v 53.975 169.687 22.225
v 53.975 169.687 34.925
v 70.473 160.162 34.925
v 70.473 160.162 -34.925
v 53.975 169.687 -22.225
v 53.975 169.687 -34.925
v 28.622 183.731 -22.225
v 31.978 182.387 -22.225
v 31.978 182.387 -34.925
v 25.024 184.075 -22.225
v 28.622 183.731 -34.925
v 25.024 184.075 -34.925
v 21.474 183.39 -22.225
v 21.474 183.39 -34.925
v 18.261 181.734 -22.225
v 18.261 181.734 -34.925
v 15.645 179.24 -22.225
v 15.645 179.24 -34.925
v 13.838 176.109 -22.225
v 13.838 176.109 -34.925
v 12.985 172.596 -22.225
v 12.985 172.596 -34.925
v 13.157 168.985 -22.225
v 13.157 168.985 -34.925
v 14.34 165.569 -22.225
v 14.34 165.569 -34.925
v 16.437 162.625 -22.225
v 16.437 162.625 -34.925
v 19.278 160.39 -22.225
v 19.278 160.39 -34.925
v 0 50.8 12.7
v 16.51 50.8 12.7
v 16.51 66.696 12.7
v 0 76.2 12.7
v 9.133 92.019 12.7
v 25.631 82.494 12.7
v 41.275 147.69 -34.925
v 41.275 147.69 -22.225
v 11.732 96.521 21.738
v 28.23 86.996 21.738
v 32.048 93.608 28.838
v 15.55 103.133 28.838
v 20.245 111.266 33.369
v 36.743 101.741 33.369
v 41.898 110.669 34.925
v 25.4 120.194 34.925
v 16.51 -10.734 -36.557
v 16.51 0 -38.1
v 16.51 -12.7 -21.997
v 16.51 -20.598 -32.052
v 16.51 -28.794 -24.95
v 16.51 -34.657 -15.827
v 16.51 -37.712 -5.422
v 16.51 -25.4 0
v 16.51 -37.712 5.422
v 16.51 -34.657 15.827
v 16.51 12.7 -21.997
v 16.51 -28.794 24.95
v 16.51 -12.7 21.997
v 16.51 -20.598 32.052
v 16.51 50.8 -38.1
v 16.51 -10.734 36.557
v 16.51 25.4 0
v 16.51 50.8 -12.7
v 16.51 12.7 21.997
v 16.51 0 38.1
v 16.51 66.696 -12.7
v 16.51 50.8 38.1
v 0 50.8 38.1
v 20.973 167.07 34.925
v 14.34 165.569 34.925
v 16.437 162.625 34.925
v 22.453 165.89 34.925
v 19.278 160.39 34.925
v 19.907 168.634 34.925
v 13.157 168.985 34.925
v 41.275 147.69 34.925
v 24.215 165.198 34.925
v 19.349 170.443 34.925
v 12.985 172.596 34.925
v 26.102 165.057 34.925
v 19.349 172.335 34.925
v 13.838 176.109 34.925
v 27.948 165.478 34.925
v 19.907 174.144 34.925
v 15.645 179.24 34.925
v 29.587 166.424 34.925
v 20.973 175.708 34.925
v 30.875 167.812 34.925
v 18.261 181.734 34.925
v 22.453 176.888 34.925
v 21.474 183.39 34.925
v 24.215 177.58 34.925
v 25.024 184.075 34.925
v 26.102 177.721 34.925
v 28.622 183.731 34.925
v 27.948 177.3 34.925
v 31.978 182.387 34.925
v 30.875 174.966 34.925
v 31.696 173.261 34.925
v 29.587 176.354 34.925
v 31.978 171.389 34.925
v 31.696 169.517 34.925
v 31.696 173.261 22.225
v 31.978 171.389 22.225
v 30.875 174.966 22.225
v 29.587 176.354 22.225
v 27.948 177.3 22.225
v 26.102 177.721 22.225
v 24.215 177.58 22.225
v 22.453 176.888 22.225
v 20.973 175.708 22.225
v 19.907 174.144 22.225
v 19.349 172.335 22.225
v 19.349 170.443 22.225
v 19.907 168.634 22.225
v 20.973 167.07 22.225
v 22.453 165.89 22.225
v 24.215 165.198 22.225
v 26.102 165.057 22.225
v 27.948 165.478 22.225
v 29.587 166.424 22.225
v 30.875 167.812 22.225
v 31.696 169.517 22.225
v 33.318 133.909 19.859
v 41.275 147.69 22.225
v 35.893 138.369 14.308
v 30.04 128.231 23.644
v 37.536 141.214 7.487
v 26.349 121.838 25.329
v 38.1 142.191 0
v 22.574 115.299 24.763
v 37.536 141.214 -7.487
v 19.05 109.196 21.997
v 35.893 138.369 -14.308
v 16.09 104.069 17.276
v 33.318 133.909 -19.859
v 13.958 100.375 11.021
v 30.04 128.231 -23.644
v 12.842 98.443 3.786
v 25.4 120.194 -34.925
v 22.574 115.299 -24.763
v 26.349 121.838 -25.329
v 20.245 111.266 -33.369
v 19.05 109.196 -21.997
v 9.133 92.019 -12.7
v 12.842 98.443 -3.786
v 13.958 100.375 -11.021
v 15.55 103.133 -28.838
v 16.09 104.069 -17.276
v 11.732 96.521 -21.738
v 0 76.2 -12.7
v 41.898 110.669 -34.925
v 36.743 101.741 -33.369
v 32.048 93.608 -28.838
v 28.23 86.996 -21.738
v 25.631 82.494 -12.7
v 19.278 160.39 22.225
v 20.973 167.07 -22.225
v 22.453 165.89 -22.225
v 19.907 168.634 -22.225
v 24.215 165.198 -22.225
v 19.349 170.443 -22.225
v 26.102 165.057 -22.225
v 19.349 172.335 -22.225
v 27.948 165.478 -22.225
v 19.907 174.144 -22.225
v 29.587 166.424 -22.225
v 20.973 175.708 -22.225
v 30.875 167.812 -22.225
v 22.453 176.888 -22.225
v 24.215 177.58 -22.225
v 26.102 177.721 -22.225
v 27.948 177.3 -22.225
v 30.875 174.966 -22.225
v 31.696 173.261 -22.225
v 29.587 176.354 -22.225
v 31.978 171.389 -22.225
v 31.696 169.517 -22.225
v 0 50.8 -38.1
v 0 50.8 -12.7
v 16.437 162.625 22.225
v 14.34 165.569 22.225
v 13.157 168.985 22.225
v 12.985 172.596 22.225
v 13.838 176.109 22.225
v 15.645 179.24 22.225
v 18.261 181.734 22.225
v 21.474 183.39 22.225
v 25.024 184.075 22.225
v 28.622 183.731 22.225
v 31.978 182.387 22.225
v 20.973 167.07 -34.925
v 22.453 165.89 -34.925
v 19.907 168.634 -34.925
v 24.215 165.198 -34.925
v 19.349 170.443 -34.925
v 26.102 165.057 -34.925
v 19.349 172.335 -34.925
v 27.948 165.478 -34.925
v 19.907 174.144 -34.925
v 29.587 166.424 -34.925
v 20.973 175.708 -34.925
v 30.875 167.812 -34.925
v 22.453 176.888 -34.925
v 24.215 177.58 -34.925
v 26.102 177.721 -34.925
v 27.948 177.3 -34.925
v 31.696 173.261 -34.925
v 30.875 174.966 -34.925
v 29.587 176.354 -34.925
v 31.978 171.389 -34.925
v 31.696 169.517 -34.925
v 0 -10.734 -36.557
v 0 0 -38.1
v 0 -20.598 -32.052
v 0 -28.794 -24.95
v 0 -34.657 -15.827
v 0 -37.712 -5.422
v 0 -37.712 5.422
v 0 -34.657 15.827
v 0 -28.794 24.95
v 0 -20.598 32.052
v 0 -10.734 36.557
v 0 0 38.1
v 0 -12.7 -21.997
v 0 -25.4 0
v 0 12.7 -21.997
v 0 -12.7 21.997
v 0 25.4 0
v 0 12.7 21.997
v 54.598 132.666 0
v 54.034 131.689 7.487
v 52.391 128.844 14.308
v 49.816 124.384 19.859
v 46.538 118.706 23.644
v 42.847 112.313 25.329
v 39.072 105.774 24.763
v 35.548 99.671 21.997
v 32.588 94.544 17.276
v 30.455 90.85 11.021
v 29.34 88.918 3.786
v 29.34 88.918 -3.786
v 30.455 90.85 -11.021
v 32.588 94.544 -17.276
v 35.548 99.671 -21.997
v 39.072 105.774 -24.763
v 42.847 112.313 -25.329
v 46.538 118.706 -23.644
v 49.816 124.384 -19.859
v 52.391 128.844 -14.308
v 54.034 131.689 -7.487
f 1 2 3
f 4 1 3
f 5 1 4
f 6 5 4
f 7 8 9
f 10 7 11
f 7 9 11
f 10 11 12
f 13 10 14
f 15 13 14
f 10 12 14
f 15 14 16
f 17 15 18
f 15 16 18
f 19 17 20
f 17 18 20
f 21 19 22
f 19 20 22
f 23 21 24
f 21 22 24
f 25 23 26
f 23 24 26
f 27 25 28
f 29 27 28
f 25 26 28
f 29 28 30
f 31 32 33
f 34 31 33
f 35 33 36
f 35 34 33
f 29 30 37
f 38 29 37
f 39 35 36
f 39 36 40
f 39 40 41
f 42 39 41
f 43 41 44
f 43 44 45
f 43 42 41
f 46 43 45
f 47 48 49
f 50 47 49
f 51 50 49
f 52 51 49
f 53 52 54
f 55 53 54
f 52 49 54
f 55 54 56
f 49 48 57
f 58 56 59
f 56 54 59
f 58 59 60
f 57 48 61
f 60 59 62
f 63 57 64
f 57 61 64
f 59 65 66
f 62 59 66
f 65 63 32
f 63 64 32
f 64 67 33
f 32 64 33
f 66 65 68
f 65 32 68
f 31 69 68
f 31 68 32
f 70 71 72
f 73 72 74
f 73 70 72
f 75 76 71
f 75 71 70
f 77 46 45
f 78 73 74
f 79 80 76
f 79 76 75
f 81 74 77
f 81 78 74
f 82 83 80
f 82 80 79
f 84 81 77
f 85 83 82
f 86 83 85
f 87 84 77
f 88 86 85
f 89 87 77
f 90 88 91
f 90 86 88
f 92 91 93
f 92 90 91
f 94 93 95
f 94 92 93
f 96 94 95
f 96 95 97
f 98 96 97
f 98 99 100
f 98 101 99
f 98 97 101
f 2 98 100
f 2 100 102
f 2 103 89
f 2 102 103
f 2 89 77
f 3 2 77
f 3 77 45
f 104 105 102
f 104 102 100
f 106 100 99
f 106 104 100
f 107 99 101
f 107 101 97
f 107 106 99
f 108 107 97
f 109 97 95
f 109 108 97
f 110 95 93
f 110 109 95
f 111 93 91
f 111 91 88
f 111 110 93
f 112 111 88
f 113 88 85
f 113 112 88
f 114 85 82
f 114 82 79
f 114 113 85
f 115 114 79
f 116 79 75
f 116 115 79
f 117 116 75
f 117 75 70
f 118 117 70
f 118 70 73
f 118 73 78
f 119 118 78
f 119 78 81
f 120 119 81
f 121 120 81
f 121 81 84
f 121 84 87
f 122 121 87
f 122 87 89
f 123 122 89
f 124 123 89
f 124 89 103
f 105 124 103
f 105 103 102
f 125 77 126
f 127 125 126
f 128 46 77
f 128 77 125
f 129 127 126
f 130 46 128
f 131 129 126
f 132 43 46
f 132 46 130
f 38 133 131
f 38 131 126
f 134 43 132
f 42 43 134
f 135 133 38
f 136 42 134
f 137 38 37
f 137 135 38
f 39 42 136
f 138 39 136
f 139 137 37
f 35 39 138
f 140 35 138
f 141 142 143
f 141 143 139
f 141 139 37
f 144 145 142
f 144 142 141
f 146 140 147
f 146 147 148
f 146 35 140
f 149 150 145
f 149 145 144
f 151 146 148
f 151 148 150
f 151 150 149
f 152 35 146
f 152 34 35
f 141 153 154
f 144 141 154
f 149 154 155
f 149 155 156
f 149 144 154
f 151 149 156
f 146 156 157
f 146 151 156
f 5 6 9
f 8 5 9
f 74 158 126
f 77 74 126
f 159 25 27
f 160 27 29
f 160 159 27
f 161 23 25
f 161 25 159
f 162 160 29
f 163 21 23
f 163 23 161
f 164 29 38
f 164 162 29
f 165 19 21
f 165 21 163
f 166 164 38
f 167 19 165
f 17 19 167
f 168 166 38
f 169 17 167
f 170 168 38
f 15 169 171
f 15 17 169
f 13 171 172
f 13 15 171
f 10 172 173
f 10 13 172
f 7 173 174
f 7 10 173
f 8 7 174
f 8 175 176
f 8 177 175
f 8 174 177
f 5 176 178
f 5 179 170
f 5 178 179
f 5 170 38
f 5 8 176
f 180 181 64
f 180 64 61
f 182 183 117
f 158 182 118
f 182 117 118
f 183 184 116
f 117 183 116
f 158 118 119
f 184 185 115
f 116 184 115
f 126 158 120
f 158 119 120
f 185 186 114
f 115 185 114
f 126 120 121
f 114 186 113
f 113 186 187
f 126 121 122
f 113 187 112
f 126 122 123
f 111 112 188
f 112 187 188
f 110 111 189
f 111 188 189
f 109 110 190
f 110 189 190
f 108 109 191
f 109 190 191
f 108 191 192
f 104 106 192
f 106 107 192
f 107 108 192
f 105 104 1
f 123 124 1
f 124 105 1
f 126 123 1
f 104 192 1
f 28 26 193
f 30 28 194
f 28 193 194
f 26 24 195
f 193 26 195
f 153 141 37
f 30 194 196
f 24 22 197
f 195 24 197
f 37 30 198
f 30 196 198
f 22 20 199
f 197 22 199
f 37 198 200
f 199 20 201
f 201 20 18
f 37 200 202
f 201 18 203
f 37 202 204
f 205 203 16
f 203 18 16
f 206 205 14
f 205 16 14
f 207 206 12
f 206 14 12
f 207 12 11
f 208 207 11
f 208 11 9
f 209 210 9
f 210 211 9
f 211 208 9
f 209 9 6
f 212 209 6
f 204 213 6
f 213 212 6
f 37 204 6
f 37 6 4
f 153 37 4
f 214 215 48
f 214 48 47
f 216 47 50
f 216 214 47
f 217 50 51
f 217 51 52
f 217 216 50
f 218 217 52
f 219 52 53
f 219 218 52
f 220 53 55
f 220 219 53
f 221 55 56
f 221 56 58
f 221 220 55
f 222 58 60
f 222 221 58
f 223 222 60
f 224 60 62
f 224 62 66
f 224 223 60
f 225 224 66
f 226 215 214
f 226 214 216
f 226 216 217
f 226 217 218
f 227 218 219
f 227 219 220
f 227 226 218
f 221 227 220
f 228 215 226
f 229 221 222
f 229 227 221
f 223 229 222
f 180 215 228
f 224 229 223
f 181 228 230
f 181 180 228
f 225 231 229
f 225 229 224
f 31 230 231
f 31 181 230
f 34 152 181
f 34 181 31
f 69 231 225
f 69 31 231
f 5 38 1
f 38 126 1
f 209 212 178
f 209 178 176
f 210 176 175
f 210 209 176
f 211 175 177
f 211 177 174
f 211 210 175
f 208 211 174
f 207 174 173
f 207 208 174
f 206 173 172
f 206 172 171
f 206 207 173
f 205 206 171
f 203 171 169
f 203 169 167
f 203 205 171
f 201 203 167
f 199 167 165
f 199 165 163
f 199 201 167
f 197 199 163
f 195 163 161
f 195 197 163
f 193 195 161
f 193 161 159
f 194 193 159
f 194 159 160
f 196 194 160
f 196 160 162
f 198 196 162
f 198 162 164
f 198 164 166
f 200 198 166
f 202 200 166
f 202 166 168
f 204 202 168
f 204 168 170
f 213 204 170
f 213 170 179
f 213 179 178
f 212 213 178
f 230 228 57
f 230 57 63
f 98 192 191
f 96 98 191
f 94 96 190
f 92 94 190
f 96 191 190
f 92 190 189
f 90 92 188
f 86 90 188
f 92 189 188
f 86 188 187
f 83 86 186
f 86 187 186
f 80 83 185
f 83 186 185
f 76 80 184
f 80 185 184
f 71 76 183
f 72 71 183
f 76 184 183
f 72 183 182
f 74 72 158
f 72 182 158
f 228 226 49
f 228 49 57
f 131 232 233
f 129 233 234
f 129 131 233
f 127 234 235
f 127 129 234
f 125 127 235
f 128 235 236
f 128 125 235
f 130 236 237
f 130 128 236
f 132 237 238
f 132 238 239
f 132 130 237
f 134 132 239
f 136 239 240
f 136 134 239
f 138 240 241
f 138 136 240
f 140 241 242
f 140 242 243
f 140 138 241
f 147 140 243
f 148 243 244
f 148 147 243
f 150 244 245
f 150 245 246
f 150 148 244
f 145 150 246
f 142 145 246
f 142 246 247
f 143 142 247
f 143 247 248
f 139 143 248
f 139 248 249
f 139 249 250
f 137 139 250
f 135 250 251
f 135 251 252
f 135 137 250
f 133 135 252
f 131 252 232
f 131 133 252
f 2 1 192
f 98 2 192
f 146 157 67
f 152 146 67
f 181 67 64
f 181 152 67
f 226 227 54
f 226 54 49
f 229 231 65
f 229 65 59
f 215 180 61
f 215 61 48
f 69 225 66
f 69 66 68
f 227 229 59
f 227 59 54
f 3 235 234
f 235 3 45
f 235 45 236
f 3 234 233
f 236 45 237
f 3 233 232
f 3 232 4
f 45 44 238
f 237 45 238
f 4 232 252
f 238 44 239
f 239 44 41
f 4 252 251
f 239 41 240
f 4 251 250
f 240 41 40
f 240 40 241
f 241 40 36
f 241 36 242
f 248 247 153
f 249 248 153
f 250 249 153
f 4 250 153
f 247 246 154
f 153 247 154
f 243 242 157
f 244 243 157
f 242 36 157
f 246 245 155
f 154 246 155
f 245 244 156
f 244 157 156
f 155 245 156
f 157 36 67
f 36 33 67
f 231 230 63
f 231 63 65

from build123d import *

# Parameters (mm, degrees)
BOSS_EXTRUDE1_DEPTH      = 16.51
SKETCH2_R                = 25.4
BOSS_EXTRUDE2_DEPTH      = 19.05
BOSS_EXTRUDE3_DEPTH      = 34.925
BOSS_EXTRUDE3_DEPTH_BACK = 34.925
SKETCH3_R                = 6.35
SKETCH3_2_R              = 6.35
CUT_EXTRUDE1_DEPTH       = 22.225


with BuildPart() as part:
    # Sketch1 → Boss-Extrude1 (new body)
    with BuildSketch(Plane(origin=(0, 0, 0), x_dir=(0, 0, -1), z_dir=(1, 0, 0))):
        with BuildLine():
            Line((-38.1, 0), (-38.1, 50.8))
            Line((-38.1, 50.8), (-12.7, 50.8))
            Line((-12.7, 50.8), (-12.7, 76.2))
            Line((-12.7, 76.2), (12.7, 76.2))
            Line((12.7, 76.2), (12.7, 50.8))
            Line((12.7, 50.8), (38.1, 50.8))
            Line((38.1, 50.8), (38.1, 0))
            ThreePointArc((38.1, 0), (0, -38.1), (-38.1, 0))
        make_face()
        Polygon((0, 25.4), (-21.997045256, 12.7), (-21.997045256, -12.7), (0, -25.4), (21.997045256, -12.7), (21.997045256, 12.7), align=None, mode=Mode.SUBTRACT)
    extrude(amount=BOSS_EXTRUDE1_DEPTH)

    # Sketch2 → Boss-Extrude2 (add)
    with BuildSketch(Plane(origin=(-32.995567884, 19.05, 0), x_dir=(0, 0, 1), z_dir=(0.8660254037844416, -0.49999999999999495, 0))):
        with BuildLine():
            Line((-12.7, -65.991135768), (12.7, -65.991135768))
            Line((12.7, -65.991135768), (12.7, -84.257067086))
            ThreePointArc((12.7, -84.257067086), (28.838369623, -97.090778855), (34.925, -116.791135768))
            Line((34.925, -116.791135768), (34.925, -173.941135768))
            Line((34.925, -173.941135768), (-34.925, -173.941135768))
            Line((-34.925, -173.941135768), (-34.925, -116.791135768))
            ThreePointArc((-34.925, -116.791135768), (-28.838369623, -97.090778855), (-12.7, -84.257067086))
            Line((-12.7, -84.257067086), (-12.7, -65.991135768))
        make_face()
        with Locations((0, -116.791135768)):
            Circle(SKETCH2_R, mode=Mode.SUBTRACT)
    extrude(amount=BOSS_EXTRUDE2_DEPTH)

    # Sketch3 → Boss-Extrude3 (add, two sides: drawn at the far end of the back side and taken through both)
    with BuildSketch(Plane.XY.offset(-BOSS_EXTRUDE3_DEPTH_BACK)):
        with BuildLine():
            Line((53.975, 169.687442339), (31.977954744, 182.387442339))
            ThreePointArc((31.977954744, 182.387442339), (14.629432116, 177.73891971), (19.277954744, 160.390397082))
            Line((19.277954744, 160.390397082), (41.275, 147.690397082))
            Line((41.275, 147.690397082), (53.975, 169.687442339))
        make_face()
        with Locations((25.627954744, 171.38891971)):
            Circle(SKETCH3_R, mode=Mode.SUBTRACT)
    extrude(amount=BOSS_EXTRUDE3_DEPTH + BOSS_EXTRUDE3_DEPTH_BACK)

    # Sketch3<2> → Cut-Extrude1 (cut, symmetric)
    with BuildSketch(Plane.XY):
        with BuildLine():
            Line((53.975, 169.687442339), (31.977954744, 182.387442339))
            ThreePointArc((31.977954744, 182.387442339), (14.629432116, 177.73891971), (19.277954744, 160.390397082))
            Line((19.277954744, 160.390397082), (41.275, 147.690397082))
            Line((41.275, 147.690397082), (53.975, 169.687442339))
        make_face()
        with Locations((25.627954744, 171.38891971)):
            Circle(SKETCH3_2_R, mode=Mode.SUBTRACT)
    extrude(amount=CUT_EXTRUDE1_DEPTH, both=True, mode=Mode.SUBTRACT)


solid = part.part
